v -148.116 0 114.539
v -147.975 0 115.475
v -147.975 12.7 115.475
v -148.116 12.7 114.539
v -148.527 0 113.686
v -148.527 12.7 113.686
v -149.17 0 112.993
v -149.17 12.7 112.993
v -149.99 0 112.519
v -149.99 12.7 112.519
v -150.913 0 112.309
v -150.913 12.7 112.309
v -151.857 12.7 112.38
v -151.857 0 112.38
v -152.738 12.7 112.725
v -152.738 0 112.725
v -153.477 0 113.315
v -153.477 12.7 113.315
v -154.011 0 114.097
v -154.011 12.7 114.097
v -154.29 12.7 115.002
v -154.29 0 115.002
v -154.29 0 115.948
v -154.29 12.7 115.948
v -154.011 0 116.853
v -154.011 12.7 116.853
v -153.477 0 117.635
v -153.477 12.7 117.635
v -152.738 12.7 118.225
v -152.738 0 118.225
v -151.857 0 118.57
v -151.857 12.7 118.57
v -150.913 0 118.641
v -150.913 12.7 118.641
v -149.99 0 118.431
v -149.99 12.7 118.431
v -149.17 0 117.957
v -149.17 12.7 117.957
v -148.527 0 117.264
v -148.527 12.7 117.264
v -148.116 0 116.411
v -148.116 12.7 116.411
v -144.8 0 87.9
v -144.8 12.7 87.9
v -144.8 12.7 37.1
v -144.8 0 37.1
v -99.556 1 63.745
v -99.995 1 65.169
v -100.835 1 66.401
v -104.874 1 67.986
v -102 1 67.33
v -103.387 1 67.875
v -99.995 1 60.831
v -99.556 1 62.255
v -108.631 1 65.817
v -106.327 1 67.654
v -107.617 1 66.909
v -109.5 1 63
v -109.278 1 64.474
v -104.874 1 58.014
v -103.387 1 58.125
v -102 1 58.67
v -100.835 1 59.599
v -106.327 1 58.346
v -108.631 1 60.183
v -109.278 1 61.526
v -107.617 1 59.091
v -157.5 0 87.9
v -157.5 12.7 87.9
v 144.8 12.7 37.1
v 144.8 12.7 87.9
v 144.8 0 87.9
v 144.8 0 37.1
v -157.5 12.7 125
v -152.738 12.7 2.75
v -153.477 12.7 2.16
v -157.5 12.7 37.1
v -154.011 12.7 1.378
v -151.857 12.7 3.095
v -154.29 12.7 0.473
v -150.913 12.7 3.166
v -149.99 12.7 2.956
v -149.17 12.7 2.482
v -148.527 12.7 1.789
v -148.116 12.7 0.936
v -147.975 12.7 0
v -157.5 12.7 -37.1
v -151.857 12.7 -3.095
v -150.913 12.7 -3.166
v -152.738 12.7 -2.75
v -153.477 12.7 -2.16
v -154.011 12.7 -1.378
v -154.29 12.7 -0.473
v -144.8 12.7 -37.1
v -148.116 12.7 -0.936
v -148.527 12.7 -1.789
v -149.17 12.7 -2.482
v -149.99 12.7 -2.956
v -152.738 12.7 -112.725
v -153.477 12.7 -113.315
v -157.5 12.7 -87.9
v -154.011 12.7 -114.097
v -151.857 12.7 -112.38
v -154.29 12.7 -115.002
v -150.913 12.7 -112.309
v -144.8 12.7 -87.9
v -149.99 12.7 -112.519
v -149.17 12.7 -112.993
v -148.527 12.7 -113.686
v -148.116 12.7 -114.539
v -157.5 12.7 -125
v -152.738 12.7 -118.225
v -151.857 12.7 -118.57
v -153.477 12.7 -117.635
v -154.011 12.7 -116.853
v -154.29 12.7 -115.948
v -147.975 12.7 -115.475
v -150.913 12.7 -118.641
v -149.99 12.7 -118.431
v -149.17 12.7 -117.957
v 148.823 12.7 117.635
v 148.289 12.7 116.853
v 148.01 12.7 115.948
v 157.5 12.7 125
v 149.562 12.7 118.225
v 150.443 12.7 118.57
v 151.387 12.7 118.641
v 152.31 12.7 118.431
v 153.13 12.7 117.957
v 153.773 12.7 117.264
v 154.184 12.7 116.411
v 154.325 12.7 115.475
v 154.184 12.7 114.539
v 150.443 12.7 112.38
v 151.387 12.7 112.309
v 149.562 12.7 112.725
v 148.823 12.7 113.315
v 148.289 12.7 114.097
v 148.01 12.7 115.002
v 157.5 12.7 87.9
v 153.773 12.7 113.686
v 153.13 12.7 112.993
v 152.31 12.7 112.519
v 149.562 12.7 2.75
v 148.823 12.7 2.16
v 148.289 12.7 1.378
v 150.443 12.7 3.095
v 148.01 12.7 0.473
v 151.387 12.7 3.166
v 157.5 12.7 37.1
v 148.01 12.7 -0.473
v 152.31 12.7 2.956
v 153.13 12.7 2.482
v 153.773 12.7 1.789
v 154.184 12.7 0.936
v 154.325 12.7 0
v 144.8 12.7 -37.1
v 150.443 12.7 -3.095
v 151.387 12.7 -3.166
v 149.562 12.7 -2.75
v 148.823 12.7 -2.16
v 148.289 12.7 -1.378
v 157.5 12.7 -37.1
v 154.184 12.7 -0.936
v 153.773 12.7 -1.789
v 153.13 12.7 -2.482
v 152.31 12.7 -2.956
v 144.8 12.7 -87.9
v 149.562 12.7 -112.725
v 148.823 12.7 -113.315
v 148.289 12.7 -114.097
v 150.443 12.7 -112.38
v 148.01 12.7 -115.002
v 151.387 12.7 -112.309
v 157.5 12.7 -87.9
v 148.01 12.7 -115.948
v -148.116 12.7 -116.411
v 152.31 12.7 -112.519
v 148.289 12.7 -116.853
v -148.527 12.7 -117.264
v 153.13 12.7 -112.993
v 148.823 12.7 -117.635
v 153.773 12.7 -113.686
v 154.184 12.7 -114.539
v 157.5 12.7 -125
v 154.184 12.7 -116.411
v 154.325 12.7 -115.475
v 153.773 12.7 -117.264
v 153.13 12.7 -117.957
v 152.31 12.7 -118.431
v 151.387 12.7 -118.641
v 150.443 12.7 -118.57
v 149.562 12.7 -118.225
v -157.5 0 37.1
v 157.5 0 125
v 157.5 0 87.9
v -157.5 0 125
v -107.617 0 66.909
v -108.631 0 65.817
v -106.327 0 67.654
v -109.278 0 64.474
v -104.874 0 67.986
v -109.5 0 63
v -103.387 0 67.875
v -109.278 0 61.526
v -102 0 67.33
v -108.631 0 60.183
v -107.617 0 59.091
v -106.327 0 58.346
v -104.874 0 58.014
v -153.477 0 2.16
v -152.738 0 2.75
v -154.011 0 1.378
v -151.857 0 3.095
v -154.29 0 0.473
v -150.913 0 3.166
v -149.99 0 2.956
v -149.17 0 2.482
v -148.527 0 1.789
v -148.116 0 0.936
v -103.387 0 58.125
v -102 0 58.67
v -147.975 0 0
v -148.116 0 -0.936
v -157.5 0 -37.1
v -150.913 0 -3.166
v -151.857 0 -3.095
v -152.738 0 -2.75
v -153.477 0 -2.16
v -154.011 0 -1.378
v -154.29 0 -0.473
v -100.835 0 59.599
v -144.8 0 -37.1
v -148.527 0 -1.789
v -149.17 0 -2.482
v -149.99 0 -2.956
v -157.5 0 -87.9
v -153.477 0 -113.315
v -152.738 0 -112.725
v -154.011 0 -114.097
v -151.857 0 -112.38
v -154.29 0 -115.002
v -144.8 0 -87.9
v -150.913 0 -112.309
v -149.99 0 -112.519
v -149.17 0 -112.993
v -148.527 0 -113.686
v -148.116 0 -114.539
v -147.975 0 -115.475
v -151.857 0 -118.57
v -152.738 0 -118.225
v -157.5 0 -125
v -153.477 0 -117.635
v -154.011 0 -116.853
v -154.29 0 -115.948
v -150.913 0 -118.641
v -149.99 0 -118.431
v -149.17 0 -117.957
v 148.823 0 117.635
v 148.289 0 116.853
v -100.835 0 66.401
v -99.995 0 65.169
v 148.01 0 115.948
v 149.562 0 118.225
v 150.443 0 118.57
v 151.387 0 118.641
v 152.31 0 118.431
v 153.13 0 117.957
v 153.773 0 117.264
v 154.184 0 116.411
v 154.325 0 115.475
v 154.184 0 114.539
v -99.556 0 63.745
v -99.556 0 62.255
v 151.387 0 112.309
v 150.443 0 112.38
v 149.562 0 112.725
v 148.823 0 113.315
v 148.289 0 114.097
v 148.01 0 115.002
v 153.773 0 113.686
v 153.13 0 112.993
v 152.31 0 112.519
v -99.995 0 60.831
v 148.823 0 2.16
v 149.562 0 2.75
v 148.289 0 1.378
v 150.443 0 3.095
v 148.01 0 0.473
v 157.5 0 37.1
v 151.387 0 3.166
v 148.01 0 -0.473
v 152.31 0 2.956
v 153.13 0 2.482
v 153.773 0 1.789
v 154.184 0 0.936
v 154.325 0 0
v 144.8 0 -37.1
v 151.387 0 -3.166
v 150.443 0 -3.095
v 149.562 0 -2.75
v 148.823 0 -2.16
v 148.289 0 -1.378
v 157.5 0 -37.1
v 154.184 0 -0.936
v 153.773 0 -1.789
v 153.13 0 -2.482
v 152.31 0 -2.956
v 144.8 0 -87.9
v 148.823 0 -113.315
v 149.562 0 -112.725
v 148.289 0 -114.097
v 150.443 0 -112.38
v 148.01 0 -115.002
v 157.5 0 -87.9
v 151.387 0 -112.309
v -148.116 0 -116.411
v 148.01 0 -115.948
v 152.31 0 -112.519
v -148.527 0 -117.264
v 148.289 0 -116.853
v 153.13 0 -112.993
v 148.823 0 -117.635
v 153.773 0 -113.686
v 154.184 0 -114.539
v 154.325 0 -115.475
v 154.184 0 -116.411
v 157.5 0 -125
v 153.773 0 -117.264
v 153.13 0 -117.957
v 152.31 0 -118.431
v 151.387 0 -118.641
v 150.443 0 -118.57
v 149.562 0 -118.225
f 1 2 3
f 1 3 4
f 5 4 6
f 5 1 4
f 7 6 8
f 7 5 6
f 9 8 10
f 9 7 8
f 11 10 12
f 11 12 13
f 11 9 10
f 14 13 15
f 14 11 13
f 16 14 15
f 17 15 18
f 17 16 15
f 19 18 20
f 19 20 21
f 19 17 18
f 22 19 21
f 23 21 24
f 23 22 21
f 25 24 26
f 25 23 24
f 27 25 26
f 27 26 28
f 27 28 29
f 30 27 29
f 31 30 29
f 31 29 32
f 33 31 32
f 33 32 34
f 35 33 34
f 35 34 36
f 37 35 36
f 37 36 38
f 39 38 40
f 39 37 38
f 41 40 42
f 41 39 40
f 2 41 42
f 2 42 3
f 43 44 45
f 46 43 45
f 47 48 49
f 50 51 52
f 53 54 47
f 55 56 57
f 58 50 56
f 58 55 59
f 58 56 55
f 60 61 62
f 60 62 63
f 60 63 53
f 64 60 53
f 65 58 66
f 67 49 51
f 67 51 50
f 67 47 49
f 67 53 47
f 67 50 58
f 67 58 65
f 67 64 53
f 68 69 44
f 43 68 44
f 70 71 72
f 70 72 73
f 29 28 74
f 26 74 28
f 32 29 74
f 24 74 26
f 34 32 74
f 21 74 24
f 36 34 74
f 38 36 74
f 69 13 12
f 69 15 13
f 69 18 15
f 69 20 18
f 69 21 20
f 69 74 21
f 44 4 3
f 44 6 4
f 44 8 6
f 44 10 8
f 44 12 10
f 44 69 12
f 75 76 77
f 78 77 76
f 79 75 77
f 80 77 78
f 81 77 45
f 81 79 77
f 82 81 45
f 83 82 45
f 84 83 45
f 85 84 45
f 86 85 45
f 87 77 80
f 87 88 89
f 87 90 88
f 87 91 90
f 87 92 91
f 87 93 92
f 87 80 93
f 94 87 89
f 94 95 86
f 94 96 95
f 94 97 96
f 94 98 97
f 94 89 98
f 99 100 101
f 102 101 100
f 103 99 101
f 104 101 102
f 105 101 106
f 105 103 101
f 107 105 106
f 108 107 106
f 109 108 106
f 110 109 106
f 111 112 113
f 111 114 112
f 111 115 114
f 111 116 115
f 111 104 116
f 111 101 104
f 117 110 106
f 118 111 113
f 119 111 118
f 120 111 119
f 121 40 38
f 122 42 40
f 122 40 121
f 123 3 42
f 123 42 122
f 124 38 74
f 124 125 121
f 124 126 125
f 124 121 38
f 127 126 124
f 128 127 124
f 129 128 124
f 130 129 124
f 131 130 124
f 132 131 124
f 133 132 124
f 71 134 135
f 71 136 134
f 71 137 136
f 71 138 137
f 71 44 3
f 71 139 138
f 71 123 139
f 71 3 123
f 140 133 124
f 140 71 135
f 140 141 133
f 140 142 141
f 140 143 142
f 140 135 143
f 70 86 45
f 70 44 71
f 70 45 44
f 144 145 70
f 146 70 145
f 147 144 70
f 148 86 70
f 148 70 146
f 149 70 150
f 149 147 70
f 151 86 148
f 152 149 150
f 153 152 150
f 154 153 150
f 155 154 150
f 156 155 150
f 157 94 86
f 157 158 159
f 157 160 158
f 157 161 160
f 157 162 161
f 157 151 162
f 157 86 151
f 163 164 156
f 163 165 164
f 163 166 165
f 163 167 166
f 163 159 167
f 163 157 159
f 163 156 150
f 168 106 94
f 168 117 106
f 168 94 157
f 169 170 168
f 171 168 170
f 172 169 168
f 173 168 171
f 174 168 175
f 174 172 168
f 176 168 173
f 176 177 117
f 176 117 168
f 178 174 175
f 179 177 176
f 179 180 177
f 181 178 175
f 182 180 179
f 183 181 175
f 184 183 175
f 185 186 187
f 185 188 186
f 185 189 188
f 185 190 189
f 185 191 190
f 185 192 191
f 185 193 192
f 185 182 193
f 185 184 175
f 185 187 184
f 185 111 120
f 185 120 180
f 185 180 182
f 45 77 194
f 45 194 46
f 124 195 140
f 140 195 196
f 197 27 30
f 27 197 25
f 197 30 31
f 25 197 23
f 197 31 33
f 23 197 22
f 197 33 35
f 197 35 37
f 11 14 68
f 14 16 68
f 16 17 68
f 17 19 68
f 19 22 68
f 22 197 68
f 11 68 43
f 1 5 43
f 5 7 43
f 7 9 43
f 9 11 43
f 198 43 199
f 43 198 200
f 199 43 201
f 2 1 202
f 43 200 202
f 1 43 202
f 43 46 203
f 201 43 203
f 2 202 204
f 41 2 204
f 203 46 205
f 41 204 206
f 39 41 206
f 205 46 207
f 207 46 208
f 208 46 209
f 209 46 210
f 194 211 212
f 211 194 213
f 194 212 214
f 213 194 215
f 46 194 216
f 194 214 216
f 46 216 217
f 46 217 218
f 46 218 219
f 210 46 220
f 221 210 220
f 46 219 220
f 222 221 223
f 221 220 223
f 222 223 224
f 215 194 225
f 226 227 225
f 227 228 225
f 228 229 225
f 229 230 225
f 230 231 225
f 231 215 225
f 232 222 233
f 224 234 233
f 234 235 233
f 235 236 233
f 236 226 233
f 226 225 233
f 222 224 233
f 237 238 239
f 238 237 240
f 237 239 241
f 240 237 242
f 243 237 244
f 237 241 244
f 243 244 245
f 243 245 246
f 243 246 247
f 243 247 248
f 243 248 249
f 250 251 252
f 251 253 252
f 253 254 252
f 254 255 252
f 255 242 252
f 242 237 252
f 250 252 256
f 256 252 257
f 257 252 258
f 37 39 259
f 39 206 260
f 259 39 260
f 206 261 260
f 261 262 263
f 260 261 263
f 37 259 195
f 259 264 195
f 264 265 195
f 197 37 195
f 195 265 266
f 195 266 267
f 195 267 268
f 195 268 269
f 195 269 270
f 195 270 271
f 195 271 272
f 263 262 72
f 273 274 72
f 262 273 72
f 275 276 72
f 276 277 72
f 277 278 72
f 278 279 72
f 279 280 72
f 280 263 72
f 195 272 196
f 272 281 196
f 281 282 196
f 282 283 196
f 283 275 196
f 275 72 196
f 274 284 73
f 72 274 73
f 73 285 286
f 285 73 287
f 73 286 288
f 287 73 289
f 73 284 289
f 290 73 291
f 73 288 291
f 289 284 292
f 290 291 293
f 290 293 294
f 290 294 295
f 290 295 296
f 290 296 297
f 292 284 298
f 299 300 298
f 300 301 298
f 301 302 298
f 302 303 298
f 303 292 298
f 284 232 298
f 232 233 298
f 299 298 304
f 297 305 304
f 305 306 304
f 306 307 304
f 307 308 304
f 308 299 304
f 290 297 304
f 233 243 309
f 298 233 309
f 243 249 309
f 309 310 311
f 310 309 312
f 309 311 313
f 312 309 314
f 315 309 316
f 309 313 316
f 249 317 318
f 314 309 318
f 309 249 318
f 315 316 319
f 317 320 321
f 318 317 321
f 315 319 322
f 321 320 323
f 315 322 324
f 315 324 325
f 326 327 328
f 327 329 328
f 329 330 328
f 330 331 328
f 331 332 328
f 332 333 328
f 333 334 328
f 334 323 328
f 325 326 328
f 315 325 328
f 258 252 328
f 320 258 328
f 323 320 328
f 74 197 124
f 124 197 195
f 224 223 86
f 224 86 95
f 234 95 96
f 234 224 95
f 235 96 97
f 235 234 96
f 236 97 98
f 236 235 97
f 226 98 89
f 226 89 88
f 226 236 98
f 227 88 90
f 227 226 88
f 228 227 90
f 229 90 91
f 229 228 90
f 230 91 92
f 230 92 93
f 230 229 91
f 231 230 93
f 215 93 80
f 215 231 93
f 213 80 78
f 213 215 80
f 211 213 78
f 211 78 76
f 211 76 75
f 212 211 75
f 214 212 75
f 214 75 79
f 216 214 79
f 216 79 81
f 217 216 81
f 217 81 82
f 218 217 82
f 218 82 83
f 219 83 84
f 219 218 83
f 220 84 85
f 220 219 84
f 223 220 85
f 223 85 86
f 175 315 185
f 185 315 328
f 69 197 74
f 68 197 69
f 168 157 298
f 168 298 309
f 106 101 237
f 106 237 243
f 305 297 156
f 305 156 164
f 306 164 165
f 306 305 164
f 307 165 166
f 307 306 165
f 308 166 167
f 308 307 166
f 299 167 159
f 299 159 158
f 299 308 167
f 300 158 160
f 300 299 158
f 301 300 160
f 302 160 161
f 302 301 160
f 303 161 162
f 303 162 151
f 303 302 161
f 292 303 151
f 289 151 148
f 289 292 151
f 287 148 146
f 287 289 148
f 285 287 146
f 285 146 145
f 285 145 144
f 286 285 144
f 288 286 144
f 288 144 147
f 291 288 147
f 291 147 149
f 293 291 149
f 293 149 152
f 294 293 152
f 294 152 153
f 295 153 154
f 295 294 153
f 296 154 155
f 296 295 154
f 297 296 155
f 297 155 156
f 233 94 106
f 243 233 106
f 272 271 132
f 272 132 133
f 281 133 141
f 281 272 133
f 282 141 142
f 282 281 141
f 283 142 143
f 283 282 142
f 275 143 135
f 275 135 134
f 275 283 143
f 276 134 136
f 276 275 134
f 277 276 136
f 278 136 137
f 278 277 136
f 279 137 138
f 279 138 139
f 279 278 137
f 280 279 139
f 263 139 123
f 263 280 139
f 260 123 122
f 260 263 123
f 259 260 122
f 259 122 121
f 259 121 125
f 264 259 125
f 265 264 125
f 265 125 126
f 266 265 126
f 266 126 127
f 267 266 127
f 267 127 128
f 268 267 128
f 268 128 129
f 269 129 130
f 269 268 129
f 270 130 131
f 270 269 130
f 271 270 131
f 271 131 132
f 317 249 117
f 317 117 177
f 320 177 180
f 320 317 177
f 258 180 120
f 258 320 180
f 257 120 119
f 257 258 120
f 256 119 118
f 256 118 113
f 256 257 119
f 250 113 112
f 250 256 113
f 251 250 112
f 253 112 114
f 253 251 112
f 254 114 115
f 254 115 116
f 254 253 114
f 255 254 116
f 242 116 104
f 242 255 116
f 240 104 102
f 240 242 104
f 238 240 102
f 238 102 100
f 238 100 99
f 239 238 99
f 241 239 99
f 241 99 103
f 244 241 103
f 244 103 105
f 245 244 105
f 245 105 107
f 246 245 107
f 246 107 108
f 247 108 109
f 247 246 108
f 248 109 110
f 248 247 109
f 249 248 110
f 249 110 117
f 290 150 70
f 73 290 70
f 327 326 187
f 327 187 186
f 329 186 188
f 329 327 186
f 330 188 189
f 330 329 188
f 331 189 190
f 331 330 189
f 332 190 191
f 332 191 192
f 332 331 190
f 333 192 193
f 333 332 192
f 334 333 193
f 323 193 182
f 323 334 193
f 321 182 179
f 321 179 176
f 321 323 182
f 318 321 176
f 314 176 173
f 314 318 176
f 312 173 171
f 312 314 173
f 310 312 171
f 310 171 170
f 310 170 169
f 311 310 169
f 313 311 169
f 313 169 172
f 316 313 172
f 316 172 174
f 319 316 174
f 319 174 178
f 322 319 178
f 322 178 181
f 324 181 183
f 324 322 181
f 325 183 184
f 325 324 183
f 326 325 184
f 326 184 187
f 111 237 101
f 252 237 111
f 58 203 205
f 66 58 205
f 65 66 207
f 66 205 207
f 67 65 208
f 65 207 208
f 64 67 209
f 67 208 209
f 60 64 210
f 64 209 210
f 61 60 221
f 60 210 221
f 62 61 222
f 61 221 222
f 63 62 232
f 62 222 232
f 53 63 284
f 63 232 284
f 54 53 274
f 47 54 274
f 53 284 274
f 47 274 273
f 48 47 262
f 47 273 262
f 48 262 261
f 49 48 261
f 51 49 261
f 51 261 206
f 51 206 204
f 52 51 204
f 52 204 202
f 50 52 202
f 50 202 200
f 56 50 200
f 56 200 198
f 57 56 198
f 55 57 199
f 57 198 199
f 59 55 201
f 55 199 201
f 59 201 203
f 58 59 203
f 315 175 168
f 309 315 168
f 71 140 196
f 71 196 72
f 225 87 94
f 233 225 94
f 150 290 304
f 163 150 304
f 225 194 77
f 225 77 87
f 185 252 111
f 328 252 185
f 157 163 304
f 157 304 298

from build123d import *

# Parameters (mm, degrees)
CROQUIS1_W              = 315
CROQUIS1_H              = 250
CROQUIS1_R              = 3.175
SALIENTE_EXTRUIR1_DEPTH = 12.7
CROQUIS2_W              = 12.7
CROQUIS2_H              = 50.8
CORTAR_EXTRUIR1_DEPTH   = 13.7
CROQUIS3_R              = 5
CORTAR_EXTRUIR2_DEPTH   = 1


with BuildPart() as part:
    # Croquis1 → Saliente-Extruir1 (new body)
    with BuildSketch(Plane(origin=(0, 0, 0), x_dir=(1, 0, 0), z_dir=(0, 1, 0))):
        Rectangle(CROQUIS1_W, CROQUIS1_H)
        with Locations((-151.15, -115.475)):
            Circle(CROQUIS1_R, mode=Mode.SUBTRACT)
        with Locations((-151.15, 0)):
            Circle(CROQUIS1_R, mode=Mode.SUBTRACT)
        with Locations((-151.15, 115.475)):
            Circle(CROQUIS1_R, mode=Mode.SUBTRACT)
        with Locations((151.15, 115.475)):
            Circle(CROQUIS1_R, mode=Mode.SUBTRACT)
        with Locations((151.15, 0)):
            Circle(CROQUIS1_R, mode=Mode.SUBTRACT)
        with Locations((151.15, -115.475)):
            Circle(CROQUIS1_R, mode=Mode.SUBTRACT)
    extrude(amount=SALIENTE_EXTRUIR1_DEPTH)

    # Croquis2 → Cortar-Extruir1 (cut, through all)
    with BuildSketch(Plane(origin=(0, 12.7, 0), x_dir=(1, 0, 0), z_dir=(0, 1, 0))):
        with Locations((-151.15, 62.5)):
            Rectangle(CROQUIS2_W, CROQUIS2_H)
        with Locations((-151.15, -62.5)):
            Rectangle(CROQUIS2_W, CROQUIS2_H)
    cortar_extruir1 = extrude(amount=-CORTAR_EXTRUIR1_DEPTH, mode=Mode.SUBTRACT)

    # Simetría1: Cortar-Extruir1 across plane
    add(cortar_extruir1.mirror(Plane(origin=(0, 0, 0), x_dir=(0, 0, 1), z_dir=(1, 0, 0))), mode=Mode.SUBTRACT)

    # Croquis3 → Cortar-Extruir2 (cut)
    with BuildSketch(Plane(origin=(0, 0, 0), x_dir=(-1, 0, 0), z_dir=(0, -1, 0))):
        with Locations((104.5, -63)):
            Circle(CROQUIS3_R)
    extrude(amount=-CORTAR_EXTRUIR2_DEPTH, mode=Mode.SUBTRACT)


solid = part.part
